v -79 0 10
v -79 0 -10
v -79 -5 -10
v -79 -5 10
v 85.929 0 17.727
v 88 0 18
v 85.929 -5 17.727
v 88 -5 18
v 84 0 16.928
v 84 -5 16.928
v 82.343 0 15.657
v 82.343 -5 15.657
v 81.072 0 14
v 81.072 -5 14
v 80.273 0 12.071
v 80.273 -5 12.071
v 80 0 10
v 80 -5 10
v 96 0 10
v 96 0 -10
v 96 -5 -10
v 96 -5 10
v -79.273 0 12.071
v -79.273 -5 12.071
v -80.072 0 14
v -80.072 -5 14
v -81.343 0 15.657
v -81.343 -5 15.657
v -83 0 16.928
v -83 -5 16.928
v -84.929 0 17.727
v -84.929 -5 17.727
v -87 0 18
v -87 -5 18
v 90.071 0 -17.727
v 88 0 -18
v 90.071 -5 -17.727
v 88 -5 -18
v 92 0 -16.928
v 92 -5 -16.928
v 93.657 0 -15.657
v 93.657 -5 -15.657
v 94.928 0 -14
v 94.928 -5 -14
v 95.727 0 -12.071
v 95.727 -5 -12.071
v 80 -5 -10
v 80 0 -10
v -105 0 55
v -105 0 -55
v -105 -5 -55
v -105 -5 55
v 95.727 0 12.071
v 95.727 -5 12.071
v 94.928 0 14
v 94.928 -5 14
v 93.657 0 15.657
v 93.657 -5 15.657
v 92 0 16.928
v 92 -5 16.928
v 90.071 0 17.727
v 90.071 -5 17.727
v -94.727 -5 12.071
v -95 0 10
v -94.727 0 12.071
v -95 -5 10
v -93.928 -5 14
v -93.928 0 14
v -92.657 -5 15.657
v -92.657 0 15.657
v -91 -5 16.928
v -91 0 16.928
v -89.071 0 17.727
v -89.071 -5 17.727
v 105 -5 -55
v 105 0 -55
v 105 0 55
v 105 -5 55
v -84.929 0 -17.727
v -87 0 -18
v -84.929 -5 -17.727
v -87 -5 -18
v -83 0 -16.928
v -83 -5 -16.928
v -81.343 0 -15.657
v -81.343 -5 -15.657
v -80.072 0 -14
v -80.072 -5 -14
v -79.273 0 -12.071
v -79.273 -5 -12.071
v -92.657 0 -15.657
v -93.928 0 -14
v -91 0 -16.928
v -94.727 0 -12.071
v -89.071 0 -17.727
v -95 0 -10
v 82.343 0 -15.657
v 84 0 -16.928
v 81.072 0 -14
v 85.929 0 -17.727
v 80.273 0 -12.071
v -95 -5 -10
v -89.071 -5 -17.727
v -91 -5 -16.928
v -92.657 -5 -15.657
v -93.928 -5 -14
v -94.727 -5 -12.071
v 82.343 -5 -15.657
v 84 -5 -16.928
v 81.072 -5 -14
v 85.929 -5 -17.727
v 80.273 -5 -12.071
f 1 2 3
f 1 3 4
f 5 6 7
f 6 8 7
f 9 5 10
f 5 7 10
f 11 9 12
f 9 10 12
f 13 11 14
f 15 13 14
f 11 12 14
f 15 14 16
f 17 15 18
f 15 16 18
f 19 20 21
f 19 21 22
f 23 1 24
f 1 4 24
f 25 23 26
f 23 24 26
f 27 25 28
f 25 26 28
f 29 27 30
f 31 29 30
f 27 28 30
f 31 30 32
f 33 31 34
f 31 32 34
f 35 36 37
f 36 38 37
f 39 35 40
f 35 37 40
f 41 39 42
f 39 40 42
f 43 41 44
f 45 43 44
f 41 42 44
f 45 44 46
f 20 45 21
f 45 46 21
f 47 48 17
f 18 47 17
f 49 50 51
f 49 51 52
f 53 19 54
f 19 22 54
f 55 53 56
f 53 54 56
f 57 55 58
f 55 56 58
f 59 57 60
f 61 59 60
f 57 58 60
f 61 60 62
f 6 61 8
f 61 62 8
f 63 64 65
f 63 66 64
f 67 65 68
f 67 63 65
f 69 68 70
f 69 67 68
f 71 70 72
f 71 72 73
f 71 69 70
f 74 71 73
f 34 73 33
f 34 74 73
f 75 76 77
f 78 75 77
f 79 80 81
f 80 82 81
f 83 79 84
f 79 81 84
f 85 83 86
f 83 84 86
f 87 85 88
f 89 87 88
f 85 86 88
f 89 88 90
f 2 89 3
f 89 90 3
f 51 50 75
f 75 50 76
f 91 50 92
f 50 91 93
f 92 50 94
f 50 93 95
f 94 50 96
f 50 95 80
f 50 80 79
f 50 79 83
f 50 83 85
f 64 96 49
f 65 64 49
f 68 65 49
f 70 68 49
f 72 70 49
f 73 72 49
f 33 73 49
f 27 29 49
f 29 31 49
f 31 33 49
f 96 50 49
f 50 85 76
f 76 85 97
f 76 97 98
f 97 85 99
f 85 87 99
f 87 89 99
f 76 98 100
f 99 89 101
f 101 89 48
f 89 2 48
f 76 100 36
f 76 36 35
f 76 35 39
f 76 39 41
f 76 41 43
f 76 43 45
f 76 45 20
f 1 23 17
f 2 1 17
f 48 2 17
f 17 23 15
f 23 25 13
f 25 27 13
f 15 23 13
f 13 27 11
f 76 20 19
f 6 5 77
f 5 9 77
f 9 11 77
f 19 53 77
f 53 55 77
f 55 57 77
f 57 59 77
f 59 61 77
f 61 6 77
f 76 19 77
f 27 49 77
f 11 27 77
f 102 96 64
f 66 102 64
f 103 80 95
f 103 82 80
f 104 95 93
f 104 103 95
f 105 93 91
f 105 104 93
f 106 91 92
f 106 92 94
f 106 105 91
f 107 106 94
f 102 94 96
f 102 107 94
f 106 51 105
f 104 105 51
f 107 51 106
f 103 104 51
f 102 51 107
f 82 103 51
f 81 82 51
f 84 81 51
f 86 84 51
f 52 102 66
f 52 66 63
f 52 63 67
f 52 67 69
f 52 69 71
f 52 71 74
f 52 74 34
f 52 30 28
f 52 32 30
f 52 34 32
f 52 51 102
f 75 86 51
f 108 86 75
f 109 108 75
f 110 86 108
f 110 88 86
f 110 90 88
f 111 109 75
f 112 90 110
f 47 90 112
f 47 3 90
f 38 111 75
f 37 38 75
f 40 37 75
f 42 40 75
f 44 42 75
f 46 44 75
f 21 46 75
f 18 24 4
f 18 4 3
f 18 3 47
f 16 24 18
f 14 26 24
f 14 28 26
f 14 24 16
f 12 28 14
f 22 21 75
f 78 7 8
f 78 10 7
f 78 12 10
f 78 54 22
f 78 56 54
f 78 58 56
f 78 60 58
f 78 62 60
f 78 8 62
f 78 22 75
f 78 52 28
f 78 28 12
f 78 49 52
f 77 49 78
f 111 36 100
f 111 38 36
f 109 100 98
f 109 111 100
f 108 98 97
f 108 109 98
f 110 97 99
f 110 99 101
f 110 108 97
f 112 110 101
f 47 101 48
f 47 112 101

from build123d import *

# Parameters (mm, degrees)
F0_W     = 210
F0_H     = 110
F0_W_2   = 16
F0_H_2   = 36
F1_DEPTH = 5
F2_R     = 7.99999


# Not quite as in the source:
# - a fillet or chamfer is up to 0.001 mm smaller than in the source, because OpenCascade refuses the exact size
# - a feature names something its author has since deleted; it is built from what else it names


with BuildPart() as f1:
    # F0 (on Front) → F1 (new body)
    with BuildSketch(Plane.XZ):
        Rectangle(F0_W, F0_H)
        with Locations((-87, 0)):
            Rectangle(F0_W_2, F0_H_2, mode=Mode.SUBTRACT)
        with Locations((88, 0)):
            Rectangle(F0_W_2, F0_H_2, mode=Mode.SUBTRACT)
    extrude(amount=F1_DEPTH)

    # F2 (radius 8 in the source; OpenCascade refuses exactly that, so slightly less here)
    f2_edges = [f1.edges().sort_by_distance(p)[0] for p in [
        (-95, -2.5, 18),
        (-79, -2.5, 18),
        (-95, -2.5, -18),
        (-79, -2.5, -18),
        (80, -2.5, 18),
        (96, -2.5, 18),
        (96, -2.5, -18),
        (80, -2.5, -18),
    ]]
    fillet(f2_edges, radius=F2_R)


solid = f1.part
